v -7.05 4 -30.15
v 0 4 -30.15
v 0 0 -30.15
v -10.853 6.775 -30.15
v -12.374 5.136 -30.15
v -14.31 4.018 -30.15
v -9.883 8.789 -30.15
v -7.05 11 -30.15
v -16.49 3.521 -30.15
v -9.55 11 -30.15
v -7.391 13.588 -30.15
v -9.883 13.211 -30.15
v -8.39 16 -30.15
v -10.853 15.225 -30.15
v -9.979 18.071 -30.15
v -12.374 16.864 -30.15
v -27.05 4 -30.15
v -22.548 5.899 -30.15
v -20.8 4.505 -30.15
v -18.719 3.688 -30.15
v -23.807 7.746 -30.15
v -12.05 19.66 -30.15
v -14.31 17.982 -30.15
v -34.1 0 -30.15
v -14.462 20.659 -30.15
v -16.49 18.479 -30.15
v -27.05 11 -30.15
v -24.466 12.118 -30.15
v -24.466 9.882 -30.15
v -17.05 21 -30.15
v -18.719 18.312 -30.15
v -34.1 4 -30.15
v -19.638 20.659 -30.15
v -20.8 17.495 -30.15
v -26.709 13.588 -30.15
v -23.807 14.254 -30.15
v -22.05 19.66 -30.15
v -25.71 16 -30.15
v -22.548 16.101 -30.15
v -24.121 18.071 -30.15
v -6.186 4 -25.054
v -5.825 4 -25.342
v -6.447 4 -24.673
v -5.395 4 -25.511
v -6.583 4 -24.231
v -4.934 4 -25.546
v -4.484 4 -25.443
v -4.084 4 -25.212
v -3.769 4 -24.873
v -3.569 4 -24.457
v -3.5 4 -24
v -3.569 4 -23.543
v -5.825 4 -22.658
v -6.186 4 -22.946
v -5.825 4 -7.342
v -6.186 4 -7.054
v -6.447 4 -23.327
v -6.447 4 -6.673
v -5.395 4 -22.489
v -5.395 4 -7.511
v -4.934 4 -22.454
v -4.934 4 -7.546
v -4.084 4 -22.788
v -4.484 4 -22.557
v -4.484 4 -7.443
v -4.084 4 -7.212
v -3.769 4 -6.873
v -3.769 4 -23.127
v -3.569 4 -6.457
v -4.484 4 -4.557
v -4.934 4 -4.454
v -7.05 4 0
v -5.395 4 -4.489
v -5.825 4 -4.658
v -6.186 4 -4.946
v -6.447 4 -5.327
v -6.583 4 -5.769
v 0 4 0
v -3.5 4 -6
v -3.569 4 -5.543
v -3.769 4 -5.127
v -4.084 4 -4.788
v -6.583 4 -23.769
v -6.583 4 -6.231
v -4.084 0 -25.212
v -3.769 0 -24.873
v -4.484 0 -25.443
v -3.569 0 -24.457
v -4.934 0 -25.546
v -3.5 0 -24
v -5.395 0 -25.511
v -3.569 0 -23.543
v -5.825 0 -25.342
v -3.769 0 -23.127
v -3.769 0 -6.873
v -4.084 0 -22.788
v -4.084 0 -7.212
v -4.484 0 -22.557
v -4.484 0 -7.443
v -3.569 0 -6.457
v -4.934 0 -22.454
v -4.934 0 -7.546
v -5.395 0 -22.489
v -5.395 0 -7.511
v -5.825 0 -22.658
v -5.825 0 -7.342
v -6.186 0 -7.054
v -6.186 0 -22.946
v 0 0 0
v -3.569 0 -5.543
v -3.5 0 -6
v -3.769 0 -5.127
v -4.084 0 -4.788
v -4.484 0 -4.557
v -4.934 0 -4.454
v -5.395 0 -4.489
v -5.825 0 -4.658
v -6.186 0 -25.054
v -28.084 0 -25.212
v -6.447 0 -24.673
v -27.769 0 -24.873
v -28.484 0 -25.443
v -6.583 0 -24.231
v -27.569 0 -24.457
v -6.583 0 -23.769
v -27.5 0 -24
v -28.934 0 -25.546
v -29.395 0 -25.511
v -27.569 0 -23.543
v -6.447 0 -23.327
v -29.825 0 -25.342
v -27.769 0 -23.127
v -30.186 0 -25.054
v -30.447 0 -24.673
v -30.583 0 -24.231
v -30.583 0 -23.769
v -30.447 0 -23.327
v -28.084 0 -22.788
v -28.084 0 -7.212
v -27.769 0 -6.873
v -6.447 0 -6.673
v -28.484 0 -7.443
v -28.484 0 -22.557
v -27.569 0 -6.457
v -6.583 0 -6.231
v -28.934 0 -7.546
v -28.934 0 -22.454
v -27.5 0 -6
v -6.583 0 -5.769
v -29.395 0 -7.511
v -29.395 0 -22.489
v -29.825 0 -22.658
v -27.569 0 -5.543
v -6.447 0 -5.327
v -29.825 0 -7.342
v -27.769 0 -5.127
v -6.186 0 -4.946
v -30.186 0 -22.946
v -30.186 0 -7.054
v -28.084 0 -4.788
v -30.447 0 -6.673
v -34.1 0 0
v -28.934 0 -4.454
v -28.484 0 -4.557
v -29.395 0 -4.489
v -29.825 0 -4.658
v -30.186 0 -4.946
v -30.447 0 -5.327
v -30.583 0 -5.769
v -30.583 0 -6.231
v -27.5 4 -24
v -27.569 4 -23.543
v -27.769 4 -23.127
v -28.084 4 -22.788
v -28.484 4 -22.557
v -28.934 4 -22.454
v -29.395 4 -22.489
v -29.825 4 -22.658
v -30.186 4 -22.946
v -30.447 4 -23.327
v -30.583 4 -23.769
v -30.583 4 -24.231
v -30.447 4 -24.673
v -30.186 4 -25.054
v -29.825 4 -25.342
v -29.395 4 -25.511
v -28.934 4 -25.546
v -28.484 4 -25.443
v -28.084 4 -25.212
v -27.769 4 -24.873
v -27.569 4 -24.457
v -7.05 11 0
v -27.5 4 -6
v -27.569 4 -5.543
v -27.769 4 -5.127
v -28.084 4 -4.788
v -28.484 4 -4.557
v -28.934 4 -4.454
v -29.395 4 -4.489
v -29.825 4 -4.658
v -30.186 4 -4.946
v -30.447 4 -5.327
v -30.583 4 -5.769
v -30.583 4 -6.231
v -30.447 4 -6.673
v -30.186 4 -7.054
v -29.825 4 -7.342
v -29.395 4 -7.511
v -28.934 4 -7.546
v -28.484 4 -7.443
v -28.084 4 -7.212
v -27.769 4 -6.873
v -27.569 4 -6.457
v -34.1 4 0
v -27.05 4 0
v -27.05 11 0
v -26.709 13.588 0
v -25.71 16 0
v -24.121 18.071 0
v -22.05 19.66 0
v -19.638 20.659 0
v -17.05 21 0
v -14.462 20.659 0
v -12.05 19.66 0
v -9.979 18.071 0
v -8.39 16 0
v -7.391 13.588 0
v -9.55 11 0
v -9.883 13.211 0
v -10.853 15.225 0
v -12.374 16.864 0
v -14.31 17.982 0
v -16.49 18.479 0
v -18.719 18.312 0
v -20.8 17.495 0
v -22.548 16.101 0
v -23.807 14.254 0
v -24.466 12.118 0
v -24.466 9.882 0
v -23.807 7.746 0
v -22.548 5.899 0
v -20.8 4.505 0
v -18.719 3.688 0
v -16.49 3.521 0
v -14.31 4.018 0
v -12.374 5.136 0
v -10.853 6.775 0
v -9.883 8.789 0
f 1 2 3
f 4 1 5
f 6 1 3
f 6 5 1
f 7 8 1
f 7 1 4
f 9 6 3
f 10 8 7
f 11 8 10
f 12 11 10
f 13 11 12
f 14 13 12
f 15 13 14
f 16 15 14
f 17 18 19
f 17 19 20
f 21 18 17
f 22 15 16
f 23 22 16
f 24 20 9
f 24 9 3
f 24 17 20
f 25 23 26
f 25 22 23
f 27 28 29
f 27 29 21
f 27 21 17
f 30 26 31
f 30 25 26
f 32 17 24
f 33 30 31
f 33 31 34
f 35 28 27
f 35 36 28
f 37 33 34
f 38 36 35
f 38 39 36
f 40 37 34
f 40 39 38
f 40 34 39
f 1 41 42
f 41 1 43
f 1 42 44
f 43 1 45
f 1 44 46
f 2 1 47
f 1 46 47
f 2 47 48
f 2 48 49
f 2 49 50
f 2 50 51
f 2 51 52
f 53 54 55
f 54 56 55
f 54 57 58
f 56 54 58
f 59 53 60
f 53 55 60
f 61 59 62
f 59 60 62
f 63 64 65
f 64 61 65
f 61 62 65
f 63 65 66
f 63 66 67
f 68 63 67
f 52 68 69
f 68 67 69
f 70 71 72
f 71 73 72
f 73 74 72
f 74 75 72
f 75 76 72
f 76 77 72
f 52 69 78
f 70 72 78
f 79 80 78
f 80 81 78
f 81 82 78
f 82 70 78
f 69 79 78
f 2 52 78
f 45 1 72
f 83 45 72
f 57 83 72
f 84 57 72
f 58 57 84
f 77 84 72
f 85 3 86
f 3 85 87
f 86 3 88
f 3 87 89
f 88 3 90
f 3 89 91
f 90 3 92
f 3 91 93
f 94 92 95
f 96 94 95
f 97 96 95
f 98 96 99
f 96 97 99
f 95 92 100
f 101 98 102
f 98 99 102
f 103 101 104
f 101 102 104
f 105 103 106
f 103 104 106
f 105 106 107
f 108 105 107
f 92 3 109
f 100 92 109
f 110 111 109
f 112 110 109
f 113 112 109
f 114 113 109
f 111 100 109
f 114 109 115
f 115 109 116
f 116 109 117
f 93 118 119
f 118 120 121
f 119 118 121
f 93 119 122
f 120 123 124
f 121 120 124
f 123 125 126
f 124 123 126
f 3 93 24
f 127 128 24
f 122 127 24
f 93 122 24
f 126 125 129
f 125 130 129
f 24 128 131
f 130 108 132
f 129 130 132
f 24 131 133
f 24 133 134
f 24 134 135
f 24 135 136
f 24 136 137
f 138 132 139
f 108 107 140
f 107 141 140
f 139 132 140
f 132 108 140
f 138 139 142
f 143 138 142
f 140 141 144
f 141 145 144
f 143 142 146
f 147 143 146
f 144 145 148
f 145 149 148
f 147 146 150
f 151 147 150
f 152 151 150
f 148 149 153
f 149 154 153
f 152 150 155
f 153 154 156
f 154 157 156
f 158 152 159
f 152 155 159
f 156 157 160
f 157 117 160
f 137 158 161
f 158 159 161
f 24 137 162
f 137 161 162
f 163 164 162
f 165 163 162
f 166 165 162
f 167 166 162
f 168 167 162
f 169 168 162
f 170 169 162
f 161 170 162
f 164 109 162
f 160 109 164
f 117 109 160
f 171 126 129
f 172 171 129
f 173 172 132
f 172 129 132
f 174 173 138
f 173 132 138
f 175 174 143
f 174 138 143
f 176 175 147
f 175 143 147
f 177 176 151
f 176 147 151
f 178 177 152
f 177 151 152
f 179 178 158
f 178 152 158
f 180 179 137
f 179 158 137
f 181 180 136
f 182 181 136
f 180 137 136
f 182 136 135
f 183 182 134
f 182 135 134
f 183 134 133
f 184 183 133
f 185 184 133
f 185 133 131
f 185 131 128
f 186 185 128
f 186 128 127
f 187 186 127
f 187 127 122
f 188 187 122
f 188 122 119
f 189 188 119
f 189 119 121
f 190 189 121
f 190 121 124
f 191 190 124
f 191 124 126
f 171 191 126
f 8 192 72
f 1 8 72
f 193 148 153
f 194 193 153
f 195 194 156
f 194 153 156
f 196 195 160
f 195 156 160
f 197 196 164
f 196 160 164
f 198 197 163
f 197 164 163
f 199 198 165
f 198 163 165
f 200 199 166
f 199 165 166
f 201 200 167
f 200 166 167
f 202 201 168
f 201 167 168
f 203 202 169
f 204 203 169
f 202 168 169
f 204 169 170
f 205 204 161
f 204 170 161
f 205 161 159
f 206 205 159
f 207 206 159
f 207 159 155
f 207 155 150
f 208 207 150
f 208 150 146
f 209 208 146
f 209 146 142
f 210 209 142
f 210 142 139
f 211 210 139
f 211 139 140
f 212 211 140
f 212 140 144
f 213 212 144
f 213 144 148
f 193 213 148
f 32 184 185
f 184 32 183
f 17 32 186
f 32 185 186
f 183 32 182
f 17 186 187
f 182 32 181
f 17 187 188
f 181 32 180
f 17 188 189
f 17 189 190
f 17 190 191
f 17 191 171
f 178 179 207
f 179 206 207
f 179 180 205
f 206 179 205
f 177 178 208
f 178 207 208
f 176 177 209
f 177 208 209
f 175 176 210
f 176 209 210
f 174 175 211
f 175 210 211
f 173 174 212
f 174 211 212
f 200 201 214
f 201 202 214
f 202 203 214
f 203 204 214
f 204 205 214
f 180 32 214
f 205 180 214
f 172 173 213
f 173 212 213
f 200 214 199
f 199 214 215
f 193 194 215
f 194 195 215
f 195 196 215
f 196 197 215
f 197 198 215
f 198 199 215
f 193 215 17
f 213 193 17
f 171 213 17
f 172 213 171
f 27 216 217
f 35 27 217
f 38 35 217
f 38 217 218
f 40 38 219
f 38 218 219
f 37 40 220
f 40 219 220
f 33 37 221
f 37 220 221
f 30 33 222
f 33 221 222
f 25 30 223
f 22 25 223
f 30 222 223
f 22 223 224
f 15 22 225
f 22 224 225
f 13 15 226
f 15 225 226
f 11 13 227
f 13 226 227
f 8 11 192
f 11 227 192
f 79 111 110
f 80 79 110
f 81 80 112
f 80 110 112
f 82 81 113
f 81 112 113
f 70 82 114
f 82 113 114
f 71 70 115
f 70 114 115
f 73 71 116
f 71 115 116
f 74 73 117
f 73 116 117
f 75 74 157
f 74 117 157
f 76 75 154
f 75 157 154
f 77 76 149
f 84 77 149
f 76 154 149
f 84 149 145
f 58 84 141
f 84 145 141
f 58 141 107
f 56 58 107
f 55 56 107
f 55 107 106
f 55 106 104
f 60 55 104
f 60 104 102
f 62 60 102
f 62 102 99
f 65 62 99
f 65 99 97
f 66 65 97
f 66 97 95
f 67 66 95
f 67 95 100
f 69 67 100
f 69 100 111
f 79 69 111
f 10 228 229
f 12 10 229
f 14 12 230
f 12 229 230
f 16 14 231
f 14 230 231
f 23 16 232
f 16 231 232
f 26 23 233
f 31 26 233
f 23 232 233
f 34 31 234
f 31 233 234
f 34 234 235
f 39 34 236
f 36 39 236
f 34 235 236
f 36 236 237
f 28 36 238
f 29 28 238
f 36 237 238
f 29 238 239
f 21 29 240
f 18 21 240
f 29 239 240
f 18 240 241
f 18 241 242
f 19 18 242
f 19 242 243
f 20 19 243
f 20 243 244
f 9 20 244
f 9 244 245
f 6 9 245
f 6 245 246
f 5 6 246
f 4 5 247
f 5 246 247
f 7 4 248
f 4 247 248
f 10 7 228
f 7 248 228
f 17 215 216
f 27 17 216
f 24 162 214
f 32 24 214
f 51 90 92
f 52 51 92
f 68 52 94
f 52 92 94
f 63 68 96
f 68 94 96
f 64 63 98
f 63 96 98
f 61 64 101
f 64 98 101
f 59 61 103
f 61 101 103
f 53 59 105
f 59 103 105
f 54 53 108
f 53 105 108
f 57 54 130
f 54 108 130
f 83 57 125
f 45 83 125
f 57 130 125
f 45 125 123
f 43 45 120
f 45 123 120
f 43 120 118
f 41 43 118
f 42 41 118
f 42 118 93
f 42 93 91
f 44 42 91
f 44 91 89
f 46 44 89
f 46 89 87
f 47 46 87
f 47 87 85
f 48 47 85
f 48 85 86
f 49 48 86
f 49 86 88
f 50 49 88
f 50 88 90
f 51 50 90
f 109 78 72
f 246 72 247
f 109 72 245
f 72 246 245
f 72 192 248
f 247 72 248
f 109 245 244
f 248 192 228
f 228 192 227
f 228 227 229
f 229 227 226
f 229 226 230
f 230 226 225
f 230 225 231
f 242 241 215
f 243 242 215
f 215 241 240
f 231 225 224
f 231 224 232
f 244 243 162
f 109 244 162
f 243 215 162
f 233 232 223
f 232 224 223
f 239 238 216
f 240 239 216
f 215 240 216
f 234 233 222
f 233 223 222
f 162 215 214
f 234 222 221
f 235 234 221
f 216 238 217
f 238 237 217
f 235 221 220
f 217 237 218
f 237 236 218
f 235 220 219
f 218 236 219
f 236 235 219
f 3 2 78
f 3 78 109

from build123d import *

# Parameters (mm, degrees)
SKETCH1_R           = 7.5
BOSS_EXTRUDE1_DEPTH = 30.15
SKETCH2_R           = 1.55
CUT_EXTRUDE1_DEPTH  = 30.15


with BuildPart() as part:
    # Sketch1 → Boss-Extrude1 (new body)
    with BuildSketch(Plane.XY):
        with BuildLine():
            Line((0, 0), (-34.1, 0))
            Line((-34.1, 0), (-34.1, 4))
            Line((-34.1, 4), (-27.05, 4))
            Line((-27.05, 4), (-27.05, 11))
            ThreePointArc((-27.05, 11), (-17.05, 21), (-7.05, 11))
            Line((-7.05, 11), (-7.05, 4))
            Line((-7.05, 4), (0, 4))
            Line((0, 4), (0, 0))
        make_face()
        with Locations((-17.05, 11)):
            Circle(SKETCH1_R, mode=Mode.SUBTRACT)
    extrude(amount=-BOSS_EXTRUDE1_DEPTH)

    # Sketch2 → Cut-Extrude1 (cut)
    with BuildSketch(Plane(origin=(0, 0, 0), x_dir=(-1, 0, 0), z_dir=(0, -1, 0))):
        with Locations(Location((29.05, 6, 0), (0, 0, 180))):
            Circle(SKETCH2_R)
        with Locations(Location((29.05, 24, 0), (0, 0, 180))):
            Circle(SKETCH2_R)
        with Locations(Location((5.05, 6, 0), (0, 0, 180))):
            Circle(SKETCH2_R)
        with Locations(Location((5.05, 24, 0), (0, 0, 180))):
            Circle(SKETCH2_R)
    extrude(amount=-CUT_EXTRUDE1_DEPTH, mode=Mode.SUBTRACT)


solid = part.part
